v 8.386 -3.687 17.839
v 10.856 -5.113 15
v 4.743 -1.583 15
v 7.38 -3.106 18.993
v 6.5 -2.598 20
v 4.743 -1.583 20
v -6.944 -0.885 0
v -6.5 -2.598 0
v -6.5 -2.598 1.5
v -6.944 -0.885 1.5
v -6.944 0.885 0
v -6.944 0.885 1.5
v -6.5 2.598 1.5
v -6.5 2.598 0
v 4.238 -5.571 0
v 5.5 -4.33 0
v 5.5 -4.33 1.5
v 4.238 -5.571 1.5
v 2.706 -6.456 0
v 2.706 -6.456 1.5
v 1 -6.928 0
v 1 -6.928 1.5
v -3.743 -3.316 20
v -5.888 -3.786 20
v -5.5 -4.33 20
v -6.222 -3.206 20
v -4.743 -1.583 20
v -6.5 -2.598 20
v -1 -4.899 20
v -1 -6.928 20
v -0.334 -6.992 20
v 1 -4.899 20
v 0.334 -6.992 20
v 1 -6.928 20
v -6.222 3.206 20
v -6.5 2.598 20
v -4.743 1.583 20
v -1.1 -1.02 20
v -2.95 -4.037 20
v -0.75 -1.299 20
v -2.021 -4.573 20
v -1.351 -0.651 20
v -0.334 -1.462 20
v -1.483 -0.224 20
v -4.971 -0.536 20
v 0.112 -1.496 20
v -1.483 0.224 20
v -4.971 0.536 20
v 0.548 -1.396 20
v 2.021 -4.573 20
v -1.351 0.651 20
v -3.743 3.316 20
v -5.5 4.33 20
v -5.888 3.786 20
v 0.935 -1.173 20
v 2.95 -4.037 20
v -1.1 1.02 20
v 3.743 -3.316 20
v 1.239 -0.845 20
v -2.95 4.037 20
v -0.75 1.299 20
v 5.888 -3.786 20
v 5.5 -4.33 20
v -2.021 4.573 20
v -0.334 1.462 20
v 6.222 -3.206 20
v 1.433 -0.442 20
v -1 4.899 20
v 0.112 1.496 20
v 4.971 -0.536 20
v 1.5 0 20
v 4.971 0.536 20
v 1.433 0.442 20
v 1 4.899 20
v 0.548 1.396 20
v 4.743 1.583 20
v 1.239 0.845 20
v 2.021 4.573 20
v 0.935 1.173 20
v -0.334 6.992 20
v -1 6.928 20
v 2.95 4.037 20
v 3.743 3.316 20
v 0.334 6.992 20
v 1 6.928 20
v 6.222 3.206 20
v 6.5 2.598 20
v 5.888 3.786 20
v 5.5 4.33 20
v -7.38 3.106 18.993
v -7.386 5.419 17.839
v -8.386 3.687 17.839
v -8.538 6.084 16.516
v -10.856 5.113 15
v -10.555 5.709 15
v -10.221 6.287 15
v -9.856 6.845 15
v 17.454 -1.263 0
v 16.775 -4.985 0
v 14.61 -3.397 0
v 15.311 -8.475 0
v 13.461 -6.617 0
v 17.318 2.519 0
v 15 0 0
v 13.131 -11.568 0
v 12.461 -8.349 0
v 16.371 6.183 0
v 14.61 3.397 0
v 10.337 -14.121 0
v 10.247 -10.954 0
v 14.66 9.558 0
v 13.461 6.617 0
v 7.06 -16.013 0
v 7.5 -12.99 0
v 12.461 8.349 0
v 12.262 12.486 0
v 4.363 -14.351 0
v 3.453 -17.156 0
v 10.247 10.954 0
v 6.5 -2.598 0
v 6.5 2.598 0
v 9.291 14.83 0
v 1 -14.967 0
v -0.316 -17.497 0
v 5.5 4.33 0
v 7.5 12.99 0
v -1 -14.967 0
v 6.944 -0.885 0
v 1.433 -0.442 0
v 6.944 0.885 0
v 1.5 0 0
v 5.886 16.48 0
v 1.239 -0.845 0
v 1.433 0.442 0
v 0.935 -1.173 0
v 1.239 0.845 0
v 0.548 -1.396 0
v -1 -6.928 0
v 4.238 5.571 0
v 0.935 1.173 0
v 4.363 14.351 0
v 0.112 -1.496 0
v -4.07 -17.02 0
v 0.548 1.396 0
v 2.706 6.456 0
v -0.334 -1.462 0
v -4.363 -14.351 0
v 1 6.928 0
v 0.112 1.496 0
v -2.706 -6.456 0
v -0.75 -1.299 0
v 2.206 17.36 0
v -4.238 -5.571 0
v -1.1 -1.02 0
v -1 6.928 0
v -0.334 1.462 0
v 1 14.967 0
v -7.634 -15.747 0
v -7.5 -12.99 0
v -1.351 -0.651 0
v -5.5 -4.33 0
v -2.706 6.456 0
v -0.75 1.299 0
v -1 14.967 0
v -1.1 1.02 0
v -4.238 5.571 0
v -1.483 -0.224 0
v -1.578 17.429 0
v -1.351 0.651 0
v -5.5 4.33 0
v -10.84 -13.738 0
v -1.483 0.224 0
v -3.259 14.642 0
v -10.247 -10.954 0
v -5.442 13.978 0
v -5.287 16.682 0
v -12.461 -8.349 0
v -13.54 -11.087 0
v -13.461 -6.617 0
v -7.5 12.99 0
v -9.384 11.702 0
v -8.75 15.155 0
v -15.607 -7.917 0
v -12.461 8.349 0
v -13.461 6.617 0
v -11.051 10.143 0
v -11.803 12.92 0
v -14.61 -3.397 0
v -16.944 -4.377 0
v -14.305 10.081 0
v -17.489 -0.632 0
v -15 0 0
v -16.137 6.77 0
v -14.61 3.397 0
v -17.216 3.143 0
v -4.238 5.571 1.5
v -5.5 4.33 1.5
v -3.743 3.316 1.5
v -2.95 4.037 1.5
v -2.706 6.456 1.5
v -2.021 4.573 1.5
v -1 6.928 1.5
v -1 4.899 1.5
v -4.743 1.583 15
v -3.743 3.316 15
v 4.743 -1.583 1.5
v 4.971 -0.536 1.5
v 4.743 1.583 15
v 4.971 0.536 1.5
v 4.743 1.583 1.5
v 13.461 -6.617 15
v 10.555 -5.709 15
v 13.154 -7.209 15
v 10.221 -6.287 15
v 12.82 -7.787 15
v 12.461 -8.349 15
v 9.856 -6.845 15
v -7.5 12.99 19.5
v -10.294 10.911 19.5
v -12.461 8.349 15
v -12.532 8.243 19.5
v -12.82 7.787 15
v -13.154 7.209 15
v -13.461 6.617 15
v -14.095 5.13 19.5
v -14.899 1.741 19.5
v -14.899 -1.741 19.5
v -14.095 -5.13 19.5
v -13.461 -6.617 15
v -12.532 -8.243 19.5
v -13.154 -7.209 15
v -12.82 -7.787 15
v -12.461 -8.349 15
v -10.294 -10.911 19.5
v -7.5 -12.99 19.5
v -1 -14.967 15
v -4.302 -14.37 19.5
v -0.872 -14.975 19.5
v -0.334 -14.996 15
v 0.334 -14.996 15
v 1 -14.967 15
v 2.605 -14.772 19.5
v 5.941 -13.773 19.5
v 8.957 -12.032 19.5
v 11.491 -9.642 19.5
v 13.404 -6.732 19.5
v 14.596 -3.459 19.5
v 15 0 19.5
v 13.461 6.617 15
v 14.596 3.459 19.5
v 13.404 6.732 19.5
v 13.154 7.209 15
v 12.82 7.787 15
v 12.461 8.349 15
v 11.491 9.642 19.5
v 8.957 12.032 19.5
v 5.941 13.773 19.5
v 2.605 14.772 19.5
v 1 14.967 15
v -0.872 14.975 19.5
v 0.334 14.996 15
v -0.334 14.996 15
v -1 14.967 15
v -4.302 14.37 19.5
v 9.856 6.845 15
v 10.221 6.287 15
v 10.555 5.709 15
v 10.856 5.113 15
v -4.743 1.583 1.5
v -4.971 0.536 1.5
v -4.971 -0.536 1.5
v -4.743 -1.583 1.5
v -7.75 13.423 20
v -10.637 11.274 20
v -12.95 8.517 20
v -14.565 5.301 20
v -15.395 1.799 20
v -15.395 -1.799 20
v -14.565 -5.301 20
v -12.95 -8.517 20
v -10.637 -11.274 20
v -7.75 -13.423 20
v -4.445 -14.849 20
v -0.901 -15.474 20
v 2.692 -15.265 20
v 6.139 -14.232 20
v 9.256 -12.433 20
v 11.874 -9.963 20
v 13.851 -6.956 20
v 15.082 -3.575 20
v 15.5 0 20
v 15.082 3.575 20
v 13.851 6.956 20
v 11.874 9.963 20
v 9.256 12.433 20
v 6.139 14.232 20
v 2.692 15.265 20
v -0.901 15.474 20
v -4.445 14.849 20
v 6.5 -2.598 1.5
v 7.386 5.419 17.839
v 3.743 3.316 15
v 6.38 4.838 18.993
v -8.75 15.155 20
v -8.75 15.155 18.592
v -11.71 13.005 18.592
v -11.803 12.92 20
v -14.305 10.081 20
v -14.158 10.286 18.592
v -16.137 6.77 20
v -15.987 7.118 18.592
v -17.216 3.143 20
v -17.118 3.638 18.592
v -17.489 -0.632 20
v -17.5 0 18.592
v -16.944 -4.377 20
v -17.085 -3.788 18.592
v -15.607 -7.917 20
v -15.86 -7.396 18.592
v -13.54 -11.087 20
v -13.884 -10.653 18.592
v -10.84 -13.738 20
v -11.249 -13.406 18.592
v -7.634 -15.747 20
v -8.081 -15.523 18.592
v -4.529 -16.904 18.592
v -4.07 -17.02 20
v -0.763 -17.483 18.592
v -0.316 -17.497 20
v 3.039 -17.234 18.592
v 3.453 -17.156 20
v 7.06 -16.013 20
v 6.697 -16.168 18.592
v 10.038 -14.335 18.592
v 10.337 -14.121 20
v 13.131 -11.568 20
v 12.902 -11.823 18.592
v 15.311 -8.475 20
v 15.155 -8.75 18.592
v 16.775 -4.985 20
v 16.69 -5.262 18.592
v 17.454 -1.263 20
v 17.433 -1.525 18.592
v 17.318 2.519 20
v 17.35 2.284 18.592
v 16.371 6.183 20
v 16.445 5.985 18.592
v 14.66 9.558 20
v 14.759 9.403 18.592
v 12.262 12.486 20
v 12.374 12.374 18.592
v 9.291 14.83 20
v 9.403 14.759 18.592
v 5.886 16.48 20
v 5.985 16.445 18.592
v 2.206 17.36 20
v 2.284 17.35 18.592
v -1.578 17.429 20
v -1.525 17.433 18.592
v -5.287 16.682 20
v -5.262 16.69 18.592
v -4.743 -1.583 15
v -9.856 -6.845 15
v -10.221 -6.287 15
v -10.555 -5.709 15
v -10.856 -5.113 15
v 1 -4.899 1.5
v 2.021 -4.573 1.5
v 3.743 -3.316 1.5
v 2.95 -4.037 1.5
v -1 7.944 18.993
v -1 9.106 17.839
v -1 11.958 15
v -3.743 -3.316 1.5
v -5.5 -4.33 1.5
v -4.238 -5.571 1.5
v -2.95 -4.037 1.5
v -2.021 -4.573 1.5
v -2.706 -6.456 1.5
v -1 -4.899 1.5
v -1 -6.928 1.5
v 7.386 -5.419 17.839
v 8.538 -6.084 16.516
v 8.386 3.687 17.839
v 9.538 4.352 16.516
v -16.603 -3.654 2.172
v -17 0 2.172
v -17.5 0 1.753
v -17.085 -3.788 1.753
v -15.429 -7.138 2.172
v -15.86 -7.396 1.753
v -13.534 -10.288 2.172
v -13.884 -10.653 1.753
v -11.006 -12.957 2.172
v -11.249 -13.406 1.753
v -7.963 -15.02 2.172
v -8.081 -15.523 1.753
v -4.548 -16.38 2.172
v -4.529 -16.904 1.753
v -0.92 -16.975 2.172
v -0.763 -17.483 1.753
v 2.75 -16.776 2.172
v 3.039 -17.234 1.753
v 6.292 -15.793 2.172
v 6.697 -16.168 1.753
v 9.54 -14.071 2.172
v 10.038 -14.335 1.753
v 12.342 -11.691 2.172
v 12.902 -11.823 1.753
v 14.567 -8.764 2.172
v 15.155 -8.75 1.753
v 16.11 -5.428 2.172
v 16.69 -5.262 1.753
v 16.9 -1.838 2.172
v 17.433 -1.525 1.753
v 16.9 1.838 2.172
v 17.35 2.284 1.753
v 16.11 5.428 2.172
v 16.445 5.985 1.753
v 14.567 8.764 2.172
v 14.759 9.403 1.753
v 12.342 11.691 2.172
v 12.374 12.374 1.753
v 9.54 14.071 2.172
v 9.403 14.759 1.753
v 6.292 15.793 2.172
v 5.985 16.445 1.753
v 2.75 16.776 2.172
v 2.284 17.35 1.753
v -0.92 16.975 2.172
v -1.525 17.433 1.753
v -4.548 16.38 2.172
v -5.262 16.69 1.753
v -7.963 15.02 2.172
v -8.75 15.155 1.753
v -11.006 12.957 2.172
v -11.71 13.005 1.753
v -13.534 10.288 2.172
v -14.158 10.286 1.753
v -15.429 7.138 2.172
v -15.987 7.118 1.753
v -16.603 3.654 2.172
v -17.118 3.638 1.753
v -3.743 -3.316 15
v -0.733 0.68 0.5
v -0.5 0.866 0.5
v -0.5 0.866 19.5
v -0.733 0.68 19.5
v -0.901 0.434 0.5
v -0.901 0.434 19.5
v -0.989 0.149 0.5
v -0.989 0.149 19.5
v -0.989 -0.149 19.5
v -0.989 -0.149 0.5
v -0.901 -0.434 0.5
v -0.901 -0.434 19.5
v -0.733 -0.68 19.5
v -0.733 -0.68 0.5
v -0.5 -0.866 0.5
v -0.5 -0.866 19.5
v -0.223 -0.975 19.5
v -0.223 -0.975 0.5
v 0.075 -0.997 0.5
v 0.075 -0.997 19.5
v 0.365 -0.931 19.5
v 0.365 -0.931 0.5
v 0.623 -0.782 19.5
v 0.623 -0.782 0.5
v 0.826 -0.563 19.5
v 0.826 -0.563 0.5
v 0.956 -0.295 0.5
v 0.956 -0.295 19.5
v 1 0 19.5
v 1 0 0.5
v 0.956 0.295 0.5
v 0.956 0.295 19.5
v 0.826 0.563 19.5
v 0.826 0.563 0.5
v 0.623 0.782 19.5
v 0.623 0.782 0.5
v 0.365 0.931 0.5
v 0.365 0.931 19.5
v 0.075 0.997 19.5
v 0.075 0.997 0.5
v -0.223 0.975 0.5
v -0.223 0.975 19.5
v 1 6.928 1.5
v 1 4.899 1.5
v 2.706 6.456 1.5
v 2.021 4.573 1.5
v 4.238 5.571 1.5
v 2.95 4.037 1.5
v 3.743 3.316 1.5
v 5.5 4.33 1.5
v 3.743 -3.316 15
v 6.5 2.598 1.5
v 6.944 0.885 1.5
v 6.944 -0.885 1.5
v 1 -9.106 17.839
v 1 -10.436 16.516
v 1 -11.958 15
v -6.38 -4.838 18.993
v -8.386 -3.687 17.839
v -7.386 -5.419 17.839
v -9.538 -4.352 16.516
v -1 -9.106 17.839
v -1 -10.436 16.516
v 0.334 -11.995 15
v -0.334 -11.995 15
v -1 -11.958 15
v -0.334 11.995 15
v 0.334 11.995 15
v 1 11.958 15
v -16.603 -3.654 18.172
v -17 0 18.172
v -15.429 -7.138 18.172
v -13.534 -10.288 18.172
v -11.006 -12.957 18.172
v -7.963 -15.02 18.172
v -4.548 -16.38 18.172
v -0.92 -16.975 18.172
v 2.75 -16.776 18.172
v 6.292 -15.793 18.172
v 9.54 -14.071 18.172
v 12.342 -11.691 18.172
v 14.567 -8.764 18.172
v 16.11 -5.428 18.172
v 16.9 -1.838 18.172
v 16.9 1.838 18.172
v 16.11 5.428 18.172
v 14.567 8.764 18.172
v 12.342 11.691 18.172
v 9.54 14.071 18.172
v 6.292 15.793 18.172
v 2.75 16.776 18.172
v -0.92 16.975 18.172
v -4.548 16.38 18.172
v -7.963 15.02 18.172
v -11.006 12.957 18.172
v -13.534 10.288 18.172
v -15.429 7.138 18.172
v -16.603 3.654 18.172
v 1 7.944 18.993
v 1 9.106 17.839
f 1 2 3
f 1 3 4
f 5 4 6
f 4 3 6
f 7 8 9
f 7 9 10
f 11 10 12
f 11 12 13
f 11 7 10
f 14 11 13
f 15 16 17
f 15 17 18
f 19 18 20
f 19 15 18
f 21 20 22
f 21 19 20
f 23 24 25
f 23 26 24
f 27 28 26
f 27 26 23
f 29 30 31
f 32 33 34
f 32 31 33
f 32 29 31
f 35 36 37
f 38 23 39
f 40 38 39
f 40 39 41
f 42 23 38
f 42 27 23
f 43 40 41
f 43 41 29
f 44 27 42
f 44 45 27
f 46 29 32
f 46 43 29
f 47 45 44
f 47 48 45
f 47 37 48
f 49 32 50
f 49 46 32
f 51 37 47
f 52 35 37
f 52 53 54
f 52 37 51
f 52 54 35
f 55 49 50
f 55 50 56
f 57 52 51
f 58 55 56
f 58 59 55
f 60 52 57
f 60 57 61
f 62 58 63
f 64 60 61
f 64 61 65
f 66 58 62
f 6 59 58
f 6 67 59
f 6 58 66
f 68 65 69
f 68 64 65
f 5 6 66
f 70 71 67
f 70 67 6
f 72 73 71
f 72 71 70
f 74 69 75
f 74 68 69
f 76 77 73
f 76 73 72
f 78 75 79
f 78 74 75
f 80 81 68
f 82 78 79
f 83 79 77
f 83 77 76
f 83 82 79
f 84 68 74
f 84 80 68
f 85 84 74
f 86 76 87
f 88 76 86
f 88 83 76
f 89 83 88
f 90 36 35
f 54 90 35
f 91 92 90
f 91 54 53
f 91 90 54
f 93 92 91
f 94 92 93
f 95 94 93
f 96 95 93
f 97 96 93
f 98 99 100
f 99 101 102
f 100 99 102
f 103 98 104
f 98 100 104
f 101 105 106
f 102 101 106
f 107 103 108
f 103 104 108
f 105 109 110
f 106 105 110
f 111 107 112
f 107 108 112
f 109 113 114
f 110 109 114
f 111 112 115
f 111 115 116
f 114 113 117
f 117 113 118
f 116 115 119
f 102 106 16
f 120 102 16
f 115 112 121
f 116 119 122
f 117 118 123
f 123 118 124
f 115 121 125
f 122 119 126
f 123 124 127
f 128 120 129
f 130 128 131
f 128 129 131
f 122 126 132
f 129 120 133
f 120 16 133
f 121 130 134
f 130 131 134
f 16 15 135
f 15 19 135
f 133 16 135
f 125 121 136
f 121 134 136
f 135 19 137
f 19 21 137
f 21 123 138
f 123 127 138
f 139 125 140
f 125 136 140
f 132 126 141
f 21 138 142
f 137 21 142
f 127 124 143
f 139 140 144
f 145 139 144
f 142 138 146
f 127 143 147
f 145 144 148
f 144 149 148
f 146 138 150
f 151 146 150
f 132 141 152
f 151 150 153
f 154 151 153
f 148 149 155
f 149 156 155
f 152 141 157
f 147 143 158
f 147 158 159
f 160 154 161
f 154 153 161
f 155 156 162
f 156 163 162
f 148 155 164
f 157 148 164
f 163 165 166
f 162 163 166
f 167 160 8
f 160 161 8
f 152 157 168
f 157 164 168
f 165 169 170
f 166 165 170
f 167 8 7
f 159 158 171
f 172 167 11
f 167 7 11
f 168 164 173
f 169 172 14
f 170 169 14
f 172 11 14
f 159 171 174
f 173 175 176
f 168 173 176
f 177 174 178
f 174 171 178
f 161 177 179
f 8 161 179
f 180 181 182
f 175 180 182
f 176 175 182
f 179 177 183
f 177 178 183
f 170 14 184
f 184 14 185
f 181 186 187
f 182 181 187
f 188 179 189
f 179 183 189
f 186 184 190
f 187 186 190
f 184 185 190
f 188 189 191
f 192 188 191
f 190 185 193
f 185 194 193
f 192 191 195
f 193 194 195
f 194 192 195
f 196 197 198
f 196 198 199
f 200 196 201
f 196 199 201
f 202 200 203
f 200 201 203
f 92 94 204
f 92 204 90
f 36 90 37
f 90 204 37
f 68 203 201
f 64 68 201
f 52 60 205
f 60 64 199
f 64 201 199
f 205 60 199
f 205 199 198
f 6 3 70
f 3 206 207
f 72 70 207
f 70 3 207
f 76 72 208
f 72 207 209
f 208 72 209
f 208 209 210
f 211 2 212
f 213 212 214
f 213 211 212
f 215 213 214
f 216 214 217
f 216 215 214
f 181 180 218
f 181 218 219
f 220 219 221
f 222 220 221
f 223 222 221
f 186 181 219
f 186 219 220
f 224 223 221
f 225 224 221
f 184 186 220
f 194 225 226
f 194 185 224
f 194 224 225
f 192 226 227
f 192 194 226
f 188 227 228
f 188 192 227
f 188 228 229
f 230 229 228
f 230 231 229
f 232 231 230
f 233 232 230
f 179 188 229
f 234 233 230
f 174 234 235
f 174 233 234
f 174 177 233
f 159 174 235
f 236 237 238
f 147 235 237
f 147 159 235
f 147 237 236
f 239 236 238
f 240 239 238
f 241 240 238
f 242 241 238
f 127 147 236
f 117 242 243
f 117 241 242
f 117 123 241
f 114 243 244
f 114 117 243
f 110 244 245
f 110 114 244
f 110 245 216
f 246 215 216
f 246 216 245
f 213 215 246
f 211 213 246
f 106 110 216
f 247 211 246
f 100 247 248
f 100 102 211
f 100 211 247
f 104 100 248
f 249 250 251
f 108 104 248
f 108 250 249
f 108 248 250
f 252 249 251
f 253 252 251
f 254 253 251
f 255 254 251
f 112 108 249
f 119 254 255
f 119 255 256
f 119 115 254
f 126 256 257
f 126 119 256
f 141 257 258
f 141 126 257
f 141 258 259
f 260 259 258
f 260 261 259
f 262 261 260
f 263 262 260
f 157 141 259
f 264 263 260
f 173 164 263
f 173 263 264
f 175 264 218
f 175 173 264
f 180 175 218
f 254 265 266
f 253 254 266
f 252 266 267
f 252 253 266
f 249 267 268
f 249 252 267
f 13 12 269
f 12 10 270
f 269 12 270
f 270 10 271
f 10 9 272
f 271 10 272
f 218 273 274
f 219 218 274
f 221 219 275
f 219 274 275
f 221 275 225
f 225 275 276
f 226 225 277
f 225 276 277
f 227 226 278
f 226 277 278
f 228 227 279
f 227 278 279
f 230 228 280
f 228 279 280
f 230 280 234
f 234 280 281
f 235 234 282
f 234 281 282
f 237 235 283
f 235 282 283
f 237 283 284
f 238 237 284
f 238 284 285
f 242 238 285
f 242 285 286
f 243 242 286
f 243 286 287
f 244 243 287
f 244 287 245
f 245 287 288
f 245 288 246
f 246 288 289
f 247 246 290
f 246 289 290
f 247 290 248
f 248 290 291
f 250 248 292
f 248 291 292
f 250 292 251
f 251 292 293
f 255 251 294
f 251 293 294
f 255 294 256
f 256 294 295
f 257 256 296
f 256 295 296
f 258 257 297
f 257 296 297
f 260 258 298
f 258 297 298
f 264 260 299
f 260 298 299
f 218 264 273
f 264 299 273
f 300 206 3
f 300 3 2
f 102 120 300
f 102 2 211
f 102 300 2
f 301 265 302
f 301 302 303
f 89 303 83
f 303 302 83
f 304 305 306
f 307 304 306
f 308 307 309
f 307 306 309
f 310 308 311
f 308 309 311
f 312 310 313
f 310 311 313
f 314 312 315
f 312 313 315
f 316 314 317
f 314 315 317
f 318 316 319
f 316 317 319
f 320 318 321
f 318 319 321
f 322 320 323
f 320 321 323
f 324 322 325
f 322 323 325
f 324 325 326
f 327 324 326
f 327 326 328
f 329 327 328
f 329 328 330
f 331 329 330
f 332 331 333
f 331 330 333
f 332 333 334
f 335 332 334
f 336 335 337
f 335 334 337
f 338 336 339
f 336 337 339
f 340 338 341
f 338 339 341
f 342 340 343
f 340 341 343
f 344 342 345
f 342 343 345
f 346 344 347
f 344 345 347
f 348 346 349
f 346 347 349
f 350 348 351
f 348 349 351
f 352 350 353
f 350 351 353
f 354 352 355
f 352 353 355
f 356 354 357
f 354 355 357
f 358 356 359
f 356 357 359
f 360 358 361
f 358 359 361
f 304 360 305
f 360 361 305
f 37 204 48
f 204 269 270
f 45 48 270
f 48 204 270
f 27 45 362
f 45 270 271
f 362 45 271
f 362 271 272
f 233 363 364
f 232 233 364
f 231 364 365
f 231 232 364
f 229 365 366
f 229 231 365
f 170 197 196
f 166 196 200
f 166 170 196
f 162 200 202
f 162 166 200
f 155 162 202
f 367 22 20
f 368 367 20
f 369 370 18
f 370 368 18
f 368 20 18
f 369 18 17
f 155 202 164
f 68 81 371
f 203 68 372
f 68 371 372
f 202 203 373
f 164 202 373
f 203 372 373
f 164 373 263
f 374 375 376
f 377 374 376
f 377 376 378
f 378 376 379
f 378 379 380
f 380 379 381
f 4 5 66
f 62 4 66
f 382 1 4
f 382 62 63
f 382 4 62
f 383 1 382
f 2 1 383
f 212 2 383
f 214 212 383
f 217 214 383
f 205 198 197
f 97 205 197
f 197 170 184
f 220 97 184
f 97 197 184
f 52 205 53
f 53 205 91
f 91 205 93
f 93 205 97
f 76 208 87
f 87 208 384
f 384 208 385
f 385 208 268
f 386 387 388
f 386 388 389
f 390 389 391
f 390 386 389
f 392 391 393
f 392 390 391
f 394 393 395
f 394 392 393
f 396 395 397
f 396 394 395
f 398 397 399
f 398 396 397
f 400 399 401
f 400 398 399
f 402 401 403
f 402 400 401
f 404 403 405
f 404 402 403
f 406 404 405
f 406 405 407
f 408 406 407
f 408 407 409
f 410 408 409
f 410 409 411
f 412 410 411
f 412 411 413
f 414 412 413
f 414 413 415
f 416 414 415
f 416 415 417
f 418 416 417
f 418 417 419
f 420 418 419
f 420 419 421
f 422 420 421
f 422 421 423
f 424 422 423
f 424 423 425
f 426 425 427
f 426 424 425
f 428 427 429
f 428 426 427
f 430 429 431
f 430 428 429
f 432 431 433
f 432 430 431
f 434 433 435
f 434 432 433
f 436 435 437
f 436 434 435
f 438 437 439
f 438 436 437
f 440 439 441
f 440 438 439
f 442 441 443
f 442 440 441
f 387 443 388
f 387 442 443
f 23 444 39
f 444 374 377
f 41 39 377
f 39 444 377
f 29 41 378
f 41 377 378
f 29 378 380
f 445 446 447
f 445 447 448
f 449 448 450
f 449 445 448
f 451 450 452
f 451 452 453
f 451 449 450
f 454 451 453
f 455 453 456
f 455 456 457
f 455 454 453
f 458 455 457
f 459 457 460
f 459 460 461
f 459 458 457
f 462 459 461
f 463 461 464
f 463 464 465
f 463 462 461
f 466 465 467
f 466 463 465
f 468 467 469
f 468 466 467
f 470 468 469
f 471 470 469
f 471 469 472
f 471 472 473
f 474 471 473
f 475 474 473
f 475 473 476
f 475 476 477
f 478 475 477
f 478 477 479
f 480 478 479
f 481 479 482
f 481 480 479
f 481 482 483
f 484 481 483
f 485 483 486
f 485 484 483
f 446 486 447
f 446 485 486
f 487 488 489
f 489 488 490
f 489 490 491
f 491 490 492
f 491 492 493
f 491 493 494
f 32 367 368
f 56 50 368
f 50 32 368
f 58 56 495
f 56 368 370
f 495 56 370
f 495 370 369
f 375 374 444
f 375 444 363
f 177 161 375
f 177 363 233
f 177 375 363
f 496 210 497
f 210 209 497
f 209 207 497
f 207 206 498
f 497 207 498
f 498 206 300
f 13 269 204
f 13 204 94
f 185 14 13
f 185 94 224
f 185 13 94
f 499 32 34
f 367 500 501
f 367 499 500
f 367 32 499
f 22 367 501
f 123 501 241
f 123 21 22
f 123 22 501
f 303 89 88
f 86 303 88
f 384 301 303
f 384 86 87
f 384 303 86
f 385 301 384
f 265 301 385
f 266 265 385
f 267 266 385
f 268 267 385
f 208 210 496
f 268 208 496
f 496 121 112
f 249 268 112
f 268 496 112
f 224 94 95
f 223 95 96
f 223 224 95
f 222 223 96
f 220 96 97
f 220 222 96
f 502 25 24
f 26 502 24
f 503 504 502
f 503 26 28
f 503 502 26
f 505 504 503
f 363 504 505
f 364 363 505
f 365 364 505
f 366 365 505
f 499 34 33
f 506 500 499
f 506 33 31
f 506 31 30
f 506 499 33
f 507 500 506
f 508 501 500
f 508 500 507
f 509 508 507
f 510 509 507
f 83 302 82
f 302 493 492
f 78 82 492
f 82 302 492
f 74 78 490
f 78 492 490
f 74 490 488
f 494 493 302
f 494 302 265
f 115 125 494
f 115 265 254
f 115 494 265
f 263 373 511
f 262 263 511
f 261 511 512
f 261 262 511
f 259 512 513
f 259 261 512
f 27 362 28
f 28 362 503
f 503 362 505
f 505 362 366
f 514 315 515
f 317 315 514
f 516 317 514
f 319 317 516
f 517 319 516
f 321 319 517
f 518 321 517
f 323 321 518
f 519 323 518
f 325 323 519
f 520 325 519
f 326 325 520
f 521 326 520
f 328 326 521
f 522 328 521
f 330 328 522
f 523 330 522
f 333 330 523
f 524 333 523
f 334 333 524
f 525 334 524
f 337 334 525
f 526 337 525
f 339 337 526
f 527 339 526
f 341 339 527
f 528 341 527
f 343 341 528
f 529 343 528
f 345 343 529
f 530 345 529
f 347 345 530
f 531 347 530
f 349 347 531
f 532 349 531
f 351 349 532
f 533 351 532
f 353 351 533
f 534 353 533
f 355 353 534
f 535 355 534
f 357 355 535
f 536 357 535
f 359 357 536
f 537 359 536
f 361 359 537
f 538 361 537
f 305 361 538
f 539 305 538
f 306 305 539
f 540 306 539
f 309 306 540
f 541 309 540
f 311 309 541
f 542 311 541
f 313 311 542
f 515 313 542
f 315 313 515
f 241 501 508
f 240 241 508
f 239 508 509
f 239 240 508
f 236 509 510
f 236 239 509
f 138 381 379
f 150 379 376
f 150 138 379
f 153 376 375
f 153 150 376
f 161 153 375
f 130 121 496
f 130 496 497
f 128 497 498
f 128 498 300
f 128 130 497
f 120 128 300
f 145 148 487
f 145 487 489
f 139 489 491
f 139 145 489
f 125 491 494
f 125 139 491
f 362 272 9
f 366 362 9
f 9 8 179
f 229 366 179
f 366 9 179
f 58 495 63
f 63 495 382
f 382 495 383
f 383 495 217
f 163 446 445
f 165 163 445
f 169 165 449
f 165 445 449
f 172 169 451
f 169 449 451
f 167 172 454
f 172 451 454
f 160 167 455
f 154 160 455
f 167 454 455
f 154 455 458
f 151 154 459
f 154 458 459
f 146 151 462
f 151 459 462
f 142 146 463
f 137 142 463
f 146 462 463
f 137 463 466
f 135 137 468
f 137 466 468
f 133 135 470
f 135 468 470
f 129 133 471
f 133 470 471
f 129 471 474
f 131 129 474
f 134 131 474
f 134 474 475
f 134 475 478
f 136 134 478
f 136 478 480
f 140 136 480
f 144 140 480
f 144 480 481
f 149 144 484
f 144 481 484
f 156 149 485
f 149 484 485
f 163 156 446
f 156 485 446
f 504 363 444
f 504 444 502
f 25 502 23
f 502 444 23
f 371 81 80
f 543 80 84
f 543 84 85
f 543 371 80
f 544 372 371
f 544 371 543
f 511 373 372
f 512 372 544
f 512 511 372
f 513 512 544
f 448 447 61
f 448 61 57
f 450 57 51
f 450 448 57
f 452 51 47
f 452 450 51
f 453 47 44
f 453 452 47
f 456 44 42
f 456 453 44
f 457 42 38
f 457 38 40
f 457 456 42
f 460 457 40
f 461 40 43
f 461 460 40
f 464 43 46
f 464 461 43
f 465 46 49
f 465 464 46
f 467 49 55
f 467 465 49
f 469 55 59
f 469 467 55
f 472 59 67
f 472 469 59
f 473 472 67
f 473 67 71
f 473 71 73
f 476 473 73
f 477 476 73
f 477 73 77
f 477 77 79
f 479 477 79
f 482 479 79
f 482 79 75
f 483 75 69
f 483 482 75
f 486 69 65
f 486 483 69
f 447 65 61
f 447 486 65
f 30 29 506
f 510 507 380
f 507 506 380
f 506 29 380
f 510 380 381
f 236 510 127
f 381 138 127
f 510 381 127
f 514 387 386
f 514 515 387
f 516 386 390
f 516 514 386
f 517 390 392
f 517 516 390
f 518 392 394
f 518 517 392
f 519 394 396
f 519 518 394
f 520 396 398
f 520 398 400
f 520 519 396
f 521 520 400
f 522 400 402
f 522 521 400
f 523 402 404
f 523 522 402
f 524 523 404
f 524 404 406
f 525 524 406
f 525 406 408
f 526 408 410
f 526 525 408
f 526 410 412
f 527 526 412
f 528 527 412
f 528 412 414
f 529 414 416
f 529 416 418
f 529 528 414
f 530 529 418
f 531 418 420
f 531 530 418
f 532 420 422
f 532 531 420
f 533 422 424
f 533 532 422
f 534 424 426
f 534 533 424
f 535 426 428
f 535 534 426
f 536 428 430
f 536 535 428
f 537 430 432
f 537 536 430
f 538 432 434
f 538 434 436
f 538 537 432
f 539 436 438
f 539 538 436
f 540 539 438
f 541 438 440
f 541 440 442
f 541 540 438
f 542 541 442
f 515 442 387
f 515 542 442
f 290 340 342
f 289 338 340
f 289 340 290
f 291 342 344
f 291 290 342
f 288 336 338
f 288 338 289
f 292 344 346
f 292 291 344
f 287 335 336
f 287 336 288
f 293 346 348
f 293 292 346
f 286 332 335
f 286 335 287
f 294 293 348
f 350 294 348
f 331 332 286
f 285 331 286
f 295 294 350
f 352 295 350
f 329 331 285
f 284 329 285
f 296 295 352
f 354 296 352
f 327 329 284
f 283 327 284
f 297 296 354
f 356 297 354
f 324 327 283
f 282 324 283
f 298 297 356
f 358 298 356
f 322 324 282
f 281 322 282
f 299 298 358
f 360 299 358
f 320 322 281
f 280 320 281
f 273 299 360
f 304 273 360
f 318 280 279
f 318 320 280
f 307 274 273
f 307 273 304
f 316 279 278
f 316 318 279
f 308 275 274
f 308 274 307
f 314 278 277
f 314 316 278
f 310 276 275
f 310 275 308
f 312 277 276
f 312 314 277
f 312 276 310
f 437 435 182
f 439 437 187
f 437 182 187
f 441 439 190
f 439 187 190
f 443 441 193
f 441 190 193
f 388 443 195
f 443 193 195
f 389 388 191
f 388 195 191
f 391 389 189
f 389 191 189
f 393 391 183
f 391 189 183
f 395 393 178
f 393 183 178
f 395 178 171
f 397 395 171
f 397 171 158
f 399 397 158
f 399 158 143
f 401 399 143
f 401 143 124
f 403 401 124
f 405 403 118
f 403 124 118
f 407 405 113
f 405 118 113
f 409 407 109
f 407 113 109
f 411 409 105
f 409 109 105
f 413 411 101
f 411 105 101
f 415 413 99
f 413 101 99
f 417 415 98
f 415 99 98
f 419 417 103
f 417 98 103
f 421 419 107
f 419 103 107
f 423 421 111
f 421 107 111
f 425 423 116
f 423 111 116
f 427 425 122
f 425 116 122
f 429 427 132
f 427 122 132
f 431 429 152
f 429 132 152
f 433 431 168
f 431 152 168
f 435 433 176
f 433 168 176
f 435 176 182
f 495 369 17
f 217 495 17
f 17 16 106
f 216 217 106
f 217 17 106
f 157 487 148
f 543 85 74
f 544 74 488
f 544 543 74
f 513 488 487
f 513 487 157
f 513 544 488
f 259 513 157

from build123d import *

# Parameters (mm, degrees)
F0_R          = 5
F0_R_2        = 1
F1_DEPTH      = 20
F0_R_3        = 17.5
F0_R_4        = 15
F2_W          = 2
F2_H          = 12
F3_DEPTH      = 15
F4_COUNT      = 6
F6_T4_ANGLE   = 359.64
F6_T11_ANGLE  = 359.64
F6_T18_ANGLE  = 359.64
F6_T25_ANGLE  = 359.64
F6_T32_ANGLE  = 359.64
F6_T39_ANGLE  = 359.64
F6_T46_ANGLE  = 359.64
F6_T53_ANGLE  = 359.64
F6_T60_ANGLE  = 359.64
F6_T67_ANGLE  = 359.64
F6_T74_ANGLE  = 359.64
F6_T81_ANGLE  = 359.64
F6_T88_ANGLE  = 359.64
F6_T95_ANGLE  = 359.64
F6_T102_ANGLE = 359.64
F6_T109_ANGLE = 359.64
F6_T116_ANGLE = 359.64
F6_T123_ANGLE = 359.64
F9_SIZE       = 0.5
F10_R         = 7
F10_R_2       = 3.5
F11_DEPTH     = 1.5
F12_SIZE      = 0.5


# Not quite as in the source:
# - a fillet or chamfer that OpenCascade refuses, or shapes differently, is made with other operations: its cross-section is extruded or revolved along the edge and cut away or added


with BuildPart() as f1:
    # F0 (on Top) → F1 (new body)
    with BuildSketch(Plane.XY):
        Circle(F0_R)
        Circle(F0_R_2, mode=Mode.SUBTRACT)
    extrude(amount=F1_DEPTH)



with BuildPart() as f1b:
    # F0 (on Top) → F1, piece 2 (new body)
    with BuildSketch(Plane.XY):
        Circle(F0_R_3)
        Circle(F0_R_4, mode=Mode.SUBTRACT)
    extrude(amount=F1_DEPTH)


with BuildPart() as f1_1:
    add(f1.part)

    add(f1b.part)  # F3 merges F1b
    # F2 (on Top) → F3 (join)
    with BuildSketch(Plane.XY):
        with Locations((0, 10)):
            Rectangle(F2_W, F2_H)
    extrude(amount=F3_DEPTH)


with BuildPart() as f4_1:
    # F4: instance of F1
    add(f1_1.part.rotate(Axis((0, 0, 0), (0, 0, -1)), 1 * 360 / F4_COUNT))


with BuildPart() as f4_2:
    # F4: instance of F1
    add(f1_1.part.rotate(Axis((0, 0, 0), (0, 0, -1)), 2 * 360 / F4_COUNT))


with BuildPart() as f4_3:
    # F4: instance of F1
    add(f1_1.part.rotate(Axis((0, 0, 0), (0, 0, -1)), 3 * 360 / F4_COUNT))


with BuildPart() as f4_4:
    # F4: instance of F1
    add(f1_1.part.rotate(Axis((0, 0, 0), (0, 0, -1)), 4 * 360 / F4_COUNT))


with BuildPart() as f4_5:
    # F4: instance of F1
    add(f1_1.part.rotate(Axis((0, 0, 0), (0, 0, -1)), 5 * 360 / F4_COUNT))


with BuildPart() as f4_4_1:
    add(f4_4.part)

    # F5: union F4_1, F4_2, F4_3, F1, F4_5
    add(f4_1.part)
    add(f4_2.part)
    add(f4_3.part)
    add(f1_1.part)
    add(f4_5.part)

    # F6: chamfer of 7 on 6 edges, made by hand


with BuildPart() as f6_tool2:
    # F6_s3 → F6_t4 (revolve)
    with BuildSketch(Plane(origin=(0, 0, 0), x_dir=(0, 0, 1), z_dir=(-0.5027182272, -0.8644503364, 0))):
        Polygon((22, 5), (15, 12), (15, 5), align=None)
    revolve(axis=Axis((0, 0, 15), (0, 0, -1)), revolution_arc=F6_T4_ANGLE)

    split(bisect_by=Plane(origin=(0.5, 0.8660254038, 0), x_dir=(0, 0, 1), z_dir=(-0.5, -0.8660254038, 0)), keep=Keep.TOP)

    split(bisect_by=Plane.XY.offset(20), keep=Keep.BOTTOM)

    split(bisect_by=Plane(origin=(-0.5, -0.8660254038, 0), x_dir=(0, 0, 1), z_dir=(0.5, 0.8660254038, 0)), keep=Keep.TOP)


with BuildPart() as f4_4_2:
    add(f4_4_1.part)

    # F6_t1: union F6_tool2
    add(f6_tool2.part)


with BuildPart() as f6_tool9:
    # F6_s10 → F6_t11 (revolve)
    with BuildSketch(Plane(origin=(0, 0, 0), x_dir=(0, 0, 1), z_dir=(-0.5027182272, -0.8644503364, 0))):
        Polygon((22, 5), (15, 12), (15, 5), align=None)
    revolve(axis=Axis((0, 0, 15), (0, 0, -1)), revolution_arc=F6_T11_ANGLE)

    split(bisect_by=Plane.XY.offset(20), keep=Keep.BOTTOM)

    split(bisect_by=Plane.YZ.offset(-1), keep=Keep.TOP)

    split(bisect_by=Plane.YZ.offset(1), keep=Keep.BOTTOM)


with BuildPart() as f4_4_3:
    add(f4_4_2.part)

    # F6_t8: union F6_tool9
    add(f6_tool9.part)


with BuildPart() as f6_tool16:
    # F6_s17 → F6_t18 (revolve)
    with BuildSketch(Plane(origin=(0, 0, 0), x_dir=(0, 0, 1), z_dir=(-0.5027182272, -0.8644503364, 0))):
        Polygon((22, 5), (15, 12), (15, 5), align=None)
    revolve(axis=Axis((0, 0, 15), (0, 0, -1)), revolution_arc=F6_T18_ANGLE)

    split(bisect_by=Plane.XY.offset(20), keep=Keep.BOTTOM)

    split(bisect_by=Plane(origin=(-0.5, 0.8660254038, 0), x_dir=(0, 0, 1), z_dir=(0.5, -0.8660254038, 0)), keep=Keep.TOP)

    split(bisect_by=Plane(origin=(0.5, -0.8660254038, 0), x_dir=(0, 0, 1), z_dir=(-0.5, 0.8660254038, 0)), keep=Keep.TOP)


with BuildPart() as f4_4_4:
    add(f4_4_3.part)

    # F6_t15: union F6_tool16
    add(f6_tool16.part)


with BuildPart() as f6_tool23:
    # F6_s24 → F6_t25 (revolve)
    with BuildSketch(Plane(origin=(0, 0, 0), x_dir=(0, 0, 1), z_dir=(0.497276838, -0.8675919239, 0))):
        Polygon((22, 5), (15, 12), (15, 5), align=None)
    revolve(axis=Axis((0, 0, 15), (0, 0, -1)), revolution_arc=F6_T25_ANGLE)

    split(bisect_by=Plane.XY.offset(20), keep=Keep.BOTTOM)

    split(bisect_by=Plane(origin=(-0.5, 0.8660254038, 0), x_dir=(0, 0, 1), z_dir=(0.5, -0.8660254038, 0)), keep=Keep.TOP)

    split(bisect_by=Plane(origin=(0.5, -0.8660254038, 0), x_dir=(0, 0, 1), z_dir=(-0.5, 0.8660254038, 0)), keep=Keep.TOP)


with BuildPart() as f4_4_5:
    add(f4_4_4.part)

    # F6_t22: union F6_tool23
    add(f6_tool23.part)


with BuildPart() as f6_tool30:
    # F6_s31 → F6_t32 (revolve)
    with BuildSketch(Plane(origin=(0, 0, 0), x_dir=(0, 0, 1), z_dir=(0.497276838, -0.8675919239, 0))):
        Polygon((22, 5), (15, 12), (15, 5), align=None)
    revolve(axis=Axis((0, 0, 15), (0, 0, -1)), revolution_arc=F6_T32_ANGLE)

    split(bisect_by=Plane(origin=(0.5, 0.8660254038, 0), x_dir=(0, 0, 1), z_dir=(-0.5, -0.8660254038, 0)), keep=Keep.TOP)

    split(bisect_by=Plane.XY.offset(20), keep=Keep.BOTTOM)

    split(bisect_by=Plane(origin=(-0.5, -0.8660254038, 0), x_dir=(0, 0, 1), z_dir=(0.5, 0.8660254038, 0)), keep=Keep.TOP)


with BuildPart() as f4_4_6:
    add(f4_4_5.part)

    # F6_t29: union F6_tool30
    add(f6_tool30.part)


with BuildPart() as f6_tool37:
    # F6_s38 → F6_t39 (revolve)
    with BuildSketch(Plane(origin=(0, 0, 0), x_dir=(0, 0, 1), z_dir=(0.497276838, -0.8675919239, 0))):
        Polygon((22, 5), (15, 12), (15, 5), align=None)
    revolve(axis=Axis((0, 0, 15), (0, 0, -1)), revolution_arc=F6_T39_ANGLE)

    split(bisect_by=Plane.XY.offset(20), keep=Keep.BOTTOM)

    split(bisect_by=Plane.YZ.offset(-1), keep=Keep.TOP)

    split(bisect_by=Plane.YZ.offset(1), keep=Keep.BOTTOM)


with BuildPart() as f4_4_7:
    add(f4_4_6.part)

    # F6_t36: union F6_tool37
    add(f6_tool37.part)


with BuildPart() as f6_tool44:
    # F6_s45 → F6_t46 (revolve)
    with BuildSketch(Plane(origin=(0, 0, 0), x_dir=(0, 0, 1), z_dir=(0.9999950652, -0.0031415875, 0))):
        Polygon((22, 5), (15, 12), (15, 5), align=None)
    revolve(axis=Axis((0, 0, 15), (0, 0, -1)), revolution_arc=F6_T46_ANGLE)

    split(bisect_by=Plane.XY.offset(20), keep=Keep.BOTTOM)

    split(bisect_by=Plane.YZ.offset(-1), keep=Keep.TOP)

    split(bisect_by=Plane.YZ.offset(1), keep=Keep.BOTTOM)


with BuildPart() as f4_4_8:
    add(f4_4_7.part)

    # F6_t43: union F6_tool44
    add(f6_tool44.part)


with BuildPart() as f6_tool51:
    # F6_s52 → F6_t53 (revolve)
    with BuildSketch(Plane(origin=(0, 0, 0), x_dir=(0, 0, 1), z_dir=(0.9999950652, -0.0031415875, 0))):
        Polygon((22, 5), (15, 12), (15, 5), align=None)
    revolve(axis=Axis((0, 0, 15), (0, 0, -1)), revolution_arc=F6_T53_ANGLE)

    split(bisect_by=Plane.XY.offset(20), keep=Keep.BOTTOM)

    split(bisect_by=Plane(origin=(-0.5, 0.8660254038, 0), x_dir=(0, 0, 1), z_dir=(0.5, -0.8660254038, 0)), keep=Keep.TOP)

    split(bisect_by=Plane(origin=(0.5, -0.8660254038, 0), x_dir=(0, 0, 1), z_dir=(-0.5, 0.8660254038, 0)), keep=Keep.TOP)


with BuildPart() as f4_4_9:
    add(f4_4_8.part)

    # F6_t50: union F6_tool51
    add(f6_tool51.part)


with BuildPart() as f6_tool58:
    # F6_s59 → F6_t60 (revolve)
    with BuildSketch(Plane(origin=(0, 0, 0), x_dir=(0, 0, 1), z_dir=(0.9999950652, -0.0031415875, 0))):
        Polygon((22, 5), (15, 12), (15, 5), align=None)
    revolve(axis=Axis((0, 0, 15), (0, 0, -1)), revolution_arc=F6_T60_ANGLE)

    split(bisect_by=Plane(origin=(0.5, 0.8660254038, 0), x_dir=(0, 0, 1), z_dir=(-0.5, -0.8660254038, 0)), keep=Keep.TOP)

    split(bisect_by=Plane.XY.offset(20), keep=Keep.BOTTOM)

    split(bisect_by=Plane(origin=(-0.5, -0.8660254038, 0), x_dir=(0, 0, 1), z_dir=(0.5, 0.8660254038, 0)), keep=Keep.TOP)


with BuildPart() as f4_4_10:
    add(f4_4_9.part)

    # F6_t57: union F6_tool58
    add(f6_tool58.part)


with BuildPart() as f6_tool65:
    # F6_s66 → F6_t67 (revolve)
    with BuildSketch(Plane(origin=(0, 0, 0), x_dir=(0, 0, 1), z_dir=(0.5027182272, 0.8644503364, 0))):
        Polygon((22, 5), (15, 12), (15, 5), align=None)
    revolve(axis=Axis((0, 0, 15), (0, 0, -1)), revolution_arc=F6_T67_ANGLE)

    split(bisect_by=Plane(origin=(0.5, 0.8660254038, 0), x_dir=(0, 0, 1), z_dir=(-0.5, -0.8660254038, 0)), keep=Keep.TOP)

    split(bisect_by=Plane.XY.offset(20), keep=Keep.BOTTOM)

    split(bisect_by=Plane(origin=(-0.5, -0.8660254038, 0), x_dir=(0, 0, 1), z_dir=(0.5, 0.8660254038, 0)), keep=Keep.TOP)


with BuildPart() as f4_4_11:
    add(f4_4_10.part)

    # F6_t64: union F6_tool65
    add(f6_tool65.part)


with BuildPart() as f6_tool72:
    # F6_s73 → F6_t74 (revolve)
    with BuildSketch(Plane(origin=(0, 0, 0), x_dir=(0, 0, 1), z_dir=(0.5027182272, 0.8644503364, 0))):
        Polygon((22, 5), (15, 12), (15, 5), align=None)
    revolve(axis=Axis((0, 0, 15), (0, 0, -1)), revolution_arc=F6_T74_ANGLE)

    split(bisect_by=Plane.XY.offset(20), keep=Keep.BOTTOM)

    split(bisect_by=Plane.YZ.offset(-1), keep=Keep.TOP)

    split(bisect_by=Plane.YZ.offset(1), keep=Keep.BOTTOM)


with BuildPart() as f4_4_12:
    add(f4_4_11.part)

    # F6_t71: union F6_tool72
    add(f6_tool72.part)


with BuildPart() as f6_tool79:
    # F6_s80 → F6_t81 (revolve)
    with BuildSketch(Plane(origin=(0, 0, 0), x_dir=(0, 0, 1), z_dir=(0.5027182272, 0.8644503364, 0))):
        Polygon((22, 5), (15, 12), (15, 5), align=None)
    revolve(axis=Axis((0, 0, 15), (0, 0, -1)), revolution_arc=F6_T81_ANGLE)

    split(bisect_by=Plane.XY.offset(20), keep=Keep.BOTTOM)

    split(bisect_by=Plane(origin=(-0.5, 0.8660254038, 0), x_dir=(0, 0, 1), z_dir=(0.5, -0.8660254038, 0)), keep=Keep.TOP)

    split(bisect_by=Plane(origin=(0.5, -0.8660254038, 0), x_dir=(0, 0, 1), z_dir=(-0.5, 0.8660254038, 0)), keep=Keep.TOP)


with BuildPart() as f4_4_13:
    add(f4_4_12.part)

    # F6_t78: union F6_tool79
    add(f6_tool79.part)


with BuildPart() as f6_tool86:
    # F6_s87 → F6_t88 (revolve)
    with BuildSketch(Plane(origin=(0, 0, 0), x_dir=(0, 0, 1), z_dir=(-0.497276838, 0.8675919239, 0))):
        Polygon((22, 5), (15, 12), (15, 5), align=None)
    revolve(axis=Axis((0, 0, 15), (0, 0, -1)), revolution_arc=F6_T88_ANGLE)

    split(bisect_by=Plane.XY.offset(20), keep=Keep.BOTTOM)

    split(bisect_by=Plane(origin=(-0.5, 0.8660254038, 0), x_dir=(0, 0, 1), z_dir=(0.5, -0.8660254038, 0)), keep=Keep.TOP)

    split(bisect_by=Plane(origin=(0.5, -0.8660254038, 0), x_dir=(0, 0, 1), z_dir=(-0.5, 0.8660254038, 0)), keep=Keep.TOP)


with BuildPart() as f4_4_14:
    add(f4_4_13.part)

    # F6_t85: union F6_tool86
    add(f6_tool86.part)


with BuildPart() as f6_tool93:
    # F6_s94 → F6_t95 (revolve)
    with BuildSketch(Plane(origin=(0, 0, 0), x_dir=(0, 0, 1), z_dir=(-0.497276838, 0.8675919239, 0))):
        Polygon((22, 5), (15, 12), (15, 5), align=None)
    revolve(axis=Axis((0, 0, 15), (0, 0, -1)), revolution_arc=F6_T95_ANGLE)

    split(bisect_by=Plane(origin=(0.5, 0.8660254038, 0), x_dir=(0, 0, 1), z_dir=(-0.5, -0.8660254038, 0)), keep=Keep.TOP)

    split(bisect_by=Plane.XY.offset(20), keep=Keep.BOTTOM)

    split(bisect_by=Plane(origin=(-0.5, -0.8660254038, 0), x_dir=(0, 0, 1), z_dir=(0.5, 0.8660254038, 0)), keep=Keep.TOP)


with BuildPart() as f4_4_15:
    add(f4_4_14.part)

    # F6_t92: union F6_tool93
    add(f6_tool93.part)


with BuildPart() as f6_tool100:
    # F6_s101 → F6_t102 (revolve)
    with BuildSketch(Plane(origin=(0, 0, 0), x_dir=(0, 0, 1), z_dir=(-0.497276838, 0.8675919239, 0))):
        Polygon((22, 5), (15, 12), (15, 5), align=None)
    revolve(axis=Axis((0, 0, 15), (0, 0, -1)), revolution_arc=F6_T102_ANGLE)

    split(bisect_by=Plane.XY.offset(20), keep=Keep.BOTTOM)

    split(bisect_by=Plane.YZ.offset(-1), keep=Keep.TOP)

    split(bisect_by=Plane.YZ.offset(1), keep=Keep.BOTTOM)


with BuildPart() as f4_4_16:
    add(f4_4_15.part)

    # F6_t99: union F6_tool100
    add(f6_tool100.part)


with BuildPart() as f6_tool107:
    # F6_s108 → F6_t109 (revolve)
    with BuildSketch(Plane(origin=(0, 0, 0), x_dir=(0, 0, 1), z_dir=(-0.9999950652, 0.0031415875, 0))):
        Polygon((22, 5), (15, 12), (15, 5), align=None)
    revolve(axis=Axis((0, 0, 15), (0, 0, -1)), revolution_arc=F6_T109_ANGLE)

    split(bisect_by=Plane.XY.offset(20), keep=Keep.BOTTOM)

    split(bisect_by=Plane.YZ.offset(-1), keep=Keep.TOP)

    split(bisect_by=Plane.YZ.offset(1), keep=Keep.BOTTOM)


with BuildPart() as f4_4_17:
    add(f4_4_16.part)

    # F6_t106: union F6_tool107
    add(f6_tool107.part)


with BuildPart() as f6_tool114:
    # F6_s115 → F6_t116 (revolve)
    with BuildSketch(Plane(origin=(0, 0, 0), x_dir=(0, 0, 1), z_dir=(-0.9999950652, 0.0031415875, 0))):
        Polygon((22, 5), (15, 12), (15, 5), align=None)
    revolve(axis=Axis((0, 0, 15), (0, 0, -1)), revolution_arc=F6_T116_ANGLE)

    split(bisect_by=Plane.XY.offset(20), keep=Keep.BOTTOM)

    split(bisect_by=Plane(origin=(-0.5, 0.8660254038, 0), x_dir=(0, 0, 1), z_dir=(0.5, -0.8660254038, 0)), keep=Keep.TOP)

    split(bisect_by=Plane(origin=(0.5, -0.8660254038, 0), x_dir=(0, 0, 1), z_dir=(-0.5, 0.8660254038, 0)), keep=Keep.TOP)


with BuildPart() as f4_4_18:
    add(f4_4_17.part)

    # F6_t113: union F6_tool114
    add(f6_tool114.part)


with BuildPart() as f6_tool121:
    # F6_s122 → F6_t123 (revolve)
    with BuildSketch(Plane(origin=(0, 0, 0), x_dir=(0, 0, 1), z_dir=(-0.9999950652, 0.0031415875, 0))):
        Polygon((22, 5), (15, 12), (15, 5), align=None)
    revolve(axis=Axis((0, 0, 15), (0, 0, -1)), revolution_arc=F6_T123_ANGLE)

    split(bisect_by=Plane(origin=(0.5, 0.8660254038, 0), x_dir=(0, 0, 1), z_dir=(-0.5, -0.8660254038, 0)), keep=Keep.TOP)

    split(bisect_by=Plane.XY.offset(20), keep=Keep.BOTTOM)

    split(bisect_by=Plane(origin=(-0.5, -0.8660254038, 0), x_dir=(0, 0, 1), z_dir=(0.5, 0.8660254038, 0)), keep=Keep.TOP)


with BuildPart() as f4_4_19:
    add(f4_4_18.part)

    # F6_t120: union F6_tool121
    add(f6_tool121.part)

    # F7 (on Front) → F8 (revolve, cut)
    with BuildSketch(Plane.XZ):
        Polygon((-17, 18.1724479471), (-20.0641777725, 20.7435983859), (-20.0641777725, -0.3987024916), (-17, 2.1724479471), align=None)
    revolve(axis=Axis((0, 0, 20), (0, 0, 1)), mode=Mode.SUBTRACT)

    # F9
    f9_edges = [f4_4_19.edges().sort_by_distance(p)[0] for p in [
        (0.5, -0.866025, 20),
        (7.5, -12.990381, 20),
    ]]
    chamfer(f9_edges, length=F9_SIZE)

    # F10 (on face) → F11 (join)
    with BuildSketch(Plane(origin=(0, 0, 0), x_dir=(1, 0, 0), z_dir=(0, 0, -1))):
        Circle(F10_R)
        Circle(F10_R_2, mode=Mode.SUBTRACT)
        with BuildLine():
            ThreePointArc((1, -6.9282032303), (3.5, -6.0621778265), (5.5, -4.3301270189))
            Line((5.5, -4.3301270189), (3.7426406871, -3.3155151466))
            ThreePointArc((3.7426406871, -3.3155151466), (2.5, -4.3301270189), (1, -4.8989794856))
            Line((1, -4.8989794856), (1, -6.9282032303))
        make_face()
    extrude(amount=-F11_DEPTH)

    # F12
    f12_edges = [f4_4_19.edges().sort_by_distance(p)[0] for p in [
        (0.5, -0.866025, 0),
    ]]
    chamfer(f12_edges, length=F12_SIZE)


solid = f4_4_19.part
